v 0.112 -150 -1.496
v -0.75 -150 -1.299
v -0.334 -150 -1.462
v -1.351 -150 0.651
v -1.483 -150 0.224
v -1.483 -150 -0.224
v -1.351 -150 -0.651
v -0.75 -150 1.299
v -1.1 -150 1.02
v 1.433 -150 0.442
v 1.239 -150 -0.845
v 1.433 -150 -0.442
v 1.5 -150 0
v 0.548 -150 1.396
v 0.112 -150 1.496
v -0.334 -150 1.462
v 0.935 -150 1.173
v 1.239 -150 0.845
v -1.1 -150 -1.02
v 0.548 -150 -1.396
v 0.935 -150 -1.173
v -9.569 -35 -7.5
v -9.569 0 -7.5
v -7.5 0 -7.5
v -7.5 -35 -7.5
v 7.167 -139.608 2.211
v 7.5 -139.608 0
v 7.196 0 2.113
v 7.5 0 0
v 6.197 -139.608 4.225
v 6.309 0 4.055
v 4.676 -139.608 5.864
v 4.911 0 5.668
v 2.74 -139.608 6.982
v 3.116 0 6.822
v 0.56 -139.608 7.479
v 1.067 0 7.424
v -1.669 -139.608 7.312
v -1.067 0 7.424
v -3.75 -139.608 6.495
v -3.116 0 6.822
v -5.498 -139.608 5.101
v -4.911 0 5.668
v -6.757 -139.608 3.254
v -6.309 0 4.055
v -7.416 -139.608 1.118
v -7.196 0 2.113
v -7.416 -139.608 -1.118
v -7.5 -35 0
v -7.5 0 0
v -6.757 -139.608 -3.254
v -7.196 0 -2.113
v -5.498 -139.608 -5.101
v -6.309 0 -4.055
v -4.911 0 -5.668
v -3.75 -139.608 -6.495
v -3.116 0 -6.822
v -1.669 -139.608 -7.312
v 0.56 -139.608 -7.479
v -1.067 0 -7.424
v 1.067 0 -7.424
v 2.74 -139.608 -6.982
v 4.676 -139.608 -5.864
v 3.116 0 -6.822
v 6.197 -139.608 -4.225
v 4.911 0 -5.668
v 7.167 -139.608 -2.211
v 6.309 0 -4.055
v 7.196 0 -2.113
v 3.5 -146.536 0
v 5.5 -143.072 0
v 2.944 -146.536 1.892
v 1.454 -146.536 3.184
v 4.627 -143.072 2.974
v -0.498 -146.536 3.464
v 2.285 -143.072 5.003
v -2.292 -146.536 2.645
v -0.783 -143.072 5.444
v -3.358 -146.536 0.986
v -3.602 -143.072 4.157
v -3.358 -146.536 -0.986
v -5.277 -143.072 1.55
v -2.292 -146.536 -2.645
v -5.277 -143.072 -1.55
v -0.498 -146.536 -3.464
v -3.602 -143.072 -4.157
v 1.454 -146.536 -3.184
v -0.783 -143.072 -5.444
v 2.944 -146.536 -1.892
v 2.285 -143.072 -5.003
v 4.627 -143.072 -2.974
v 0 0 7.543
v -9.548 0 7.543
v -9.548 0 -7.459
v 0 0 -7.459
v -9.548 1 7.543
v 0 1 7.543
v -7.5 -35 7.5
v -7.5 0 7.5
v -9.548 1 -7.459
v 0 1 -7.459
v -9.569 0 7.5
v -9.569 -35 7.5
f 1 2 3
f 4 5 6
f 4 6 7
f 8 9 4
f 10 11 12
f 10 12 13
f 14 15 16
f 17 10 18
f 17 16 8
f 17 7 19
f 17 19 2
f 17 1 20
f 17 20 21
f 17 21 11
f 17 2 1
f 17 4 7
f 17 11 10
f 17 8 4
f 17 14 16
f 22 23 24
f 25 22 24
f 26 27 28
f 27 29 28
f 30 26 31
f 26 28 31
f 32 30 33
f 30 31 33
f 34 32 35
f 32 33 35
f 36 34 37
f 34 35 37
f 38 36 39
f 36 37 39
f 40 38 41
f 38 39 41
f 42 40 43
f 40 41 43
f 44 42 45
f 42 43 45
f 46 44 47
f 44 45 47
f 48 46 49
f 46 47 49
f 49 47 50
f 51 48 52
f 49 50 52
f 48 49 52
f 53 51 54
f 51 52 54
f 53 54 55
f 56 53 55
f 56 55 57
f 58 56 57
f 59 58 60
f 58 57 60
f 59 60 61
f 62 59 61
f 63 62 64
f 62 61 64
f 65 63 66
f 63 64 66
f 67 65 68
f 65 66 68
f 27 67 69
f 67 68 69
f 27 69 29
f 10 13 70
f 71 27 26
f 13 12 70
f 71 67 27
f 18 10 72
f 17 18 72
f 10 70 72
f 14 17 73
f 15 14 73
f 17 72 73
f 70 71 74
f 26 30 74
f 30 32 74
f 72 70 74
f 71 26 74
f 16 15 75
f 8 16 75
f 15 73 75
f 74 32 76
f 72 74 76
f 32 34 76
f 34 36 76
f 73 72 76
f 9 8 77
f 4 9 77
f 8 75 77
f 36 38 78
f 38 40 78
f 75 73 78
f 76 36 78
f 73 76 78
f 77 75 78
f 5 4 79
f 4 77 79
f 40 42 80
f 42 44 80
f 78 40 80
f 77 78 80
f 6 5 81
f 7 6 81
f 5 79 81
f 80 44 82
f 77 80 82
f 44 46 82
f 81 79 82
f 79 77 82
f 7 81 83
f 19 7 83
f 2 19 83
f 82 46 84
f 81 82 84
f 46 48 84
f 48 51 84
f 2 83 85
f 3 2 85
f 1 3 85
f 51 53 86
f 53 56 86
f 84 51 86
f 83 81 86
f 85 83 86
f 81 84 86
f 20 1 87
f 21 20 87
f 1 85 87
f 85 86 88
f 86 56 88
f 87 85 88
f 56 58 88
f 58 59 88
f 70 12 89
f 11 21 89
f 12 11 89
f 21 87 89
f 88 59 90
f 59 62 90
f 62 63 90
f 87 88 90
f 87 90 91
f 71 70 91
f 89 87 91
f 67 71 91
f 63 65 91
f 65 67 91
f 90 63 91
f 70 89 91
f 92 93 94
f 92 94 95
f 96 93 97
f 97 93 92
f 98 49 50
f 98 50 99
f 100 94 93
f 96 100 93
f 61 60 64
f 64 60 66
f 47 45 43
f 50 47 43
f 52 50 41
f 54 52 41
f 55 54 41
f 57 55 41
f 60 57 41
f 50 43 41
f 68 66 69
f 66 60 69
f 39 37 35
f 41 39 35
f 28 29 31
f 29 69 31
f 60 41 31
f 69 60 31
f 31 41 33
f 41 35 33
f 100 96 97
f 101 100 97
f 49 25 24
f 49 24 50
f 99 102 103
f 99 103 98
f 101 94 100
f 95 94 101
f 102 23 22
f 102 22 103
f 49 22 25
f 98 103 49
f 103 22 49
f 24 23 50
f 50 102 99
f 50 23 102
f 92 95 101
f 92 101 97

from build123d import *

# Parameters (mm, degrees)
F0_R     = 7.5
F1_DEPTH = 150
F2_SIZE2 = 10.3923048454
F2_SIZE  = 6
F3_W     = 2.0689371228
F3_H     = 15
F4_DEPTH = 35
F5_W     = 9.547568392
F5_H     = 15.0018753484
F6_DEPTH = 1


with BuildPart() as f1:
    # F0 (on Front) → F1 (new body)
    with BuildSketch(Plane.XZ):
        Circle(F0_R)
    extrude(amount=F1_DEPTH)

    # F2
    f2_edges = [f1.edges().sort_by_distance(p)[0] for p in [
        (-7.5, -150, 0),
    ]]
    f2_side = f1.faces().sort_by_distance((0, -150, 0))[0]
    chamfer(f2_edges, length=F2_SIZE, length2=F2_SIZE2, reference=f2_side)

    # F3 (on Front) → F4 (join)
    with BuildSketch(Plane.XZ):
        with Locations((-8.5344685614, 0)):
            Rectangle(F3_W, F3_H)
    extrude(amount=F4_DEPTH)


with BuildPart() as f6:
    # F5 (on Front) → F6 (new body)
    with BuildSketch(Plane.XZ):
        with Locations((-4.773784196, 0.0417637639)):
            Rectangle(F5_W, F5_H)
    extrude(amount=-F6_DEPTH)


solid = Compound([f1.part, f6.part])
